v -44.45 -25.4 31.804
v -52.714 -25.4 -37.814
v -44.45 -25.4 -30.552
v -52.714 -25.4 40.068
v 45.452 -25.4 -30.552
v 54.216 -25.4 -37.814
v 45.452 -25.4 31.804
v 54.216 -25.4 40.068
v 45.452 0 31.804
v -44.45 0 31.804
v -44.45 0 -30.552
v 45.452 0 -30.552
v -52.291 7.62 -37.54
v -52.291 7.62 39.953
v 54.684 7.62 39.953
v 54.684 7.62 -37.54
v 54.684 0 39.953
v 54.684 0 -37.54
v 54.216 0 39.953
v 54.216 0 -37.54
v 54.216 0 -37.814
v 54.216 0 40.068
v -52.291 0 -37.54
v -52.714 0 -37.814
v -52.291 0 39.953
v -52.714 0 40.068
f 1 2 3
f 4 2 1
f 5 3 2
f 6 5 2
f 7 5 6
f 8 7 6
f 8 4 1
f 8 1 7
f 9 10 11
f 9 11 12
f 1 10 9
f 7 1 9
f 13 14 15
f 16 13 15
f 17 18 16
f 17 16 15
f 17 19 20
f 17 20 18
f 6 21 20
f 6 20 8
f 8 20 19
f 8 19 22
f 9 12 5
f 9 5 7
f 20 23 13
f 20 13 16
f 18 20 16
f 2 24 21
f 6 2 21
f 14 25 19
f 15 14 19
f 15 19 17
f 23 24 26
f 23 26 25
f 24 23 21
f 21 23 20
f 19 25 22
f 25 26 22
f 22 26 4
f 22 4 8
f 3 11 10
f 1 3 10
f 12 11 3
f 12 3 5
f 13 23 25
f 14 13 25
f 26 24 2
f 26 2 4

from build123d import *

# Parameters (mm, degrees)
F0_W     = 106.930423
F0_H     = 77.881411
F0_W_2   = 89.901697
F0_H_2   = 62.355211
F1_DEPTH = 25.4
F2_W     = 106.974344
F2_H     = 77.493225
F3_DEPTH = 7.62


with BuildPart() as f1:
    # F0 (on Front) → F1 (new body)
    with BuildSketch(Plane.XZ):
        with Locations((0.751262, 1.126902)):
            Rectangle(F0_W, F0_H)
        with Locations((0.500841, 0.626057)):
            Rectangle(F0_W_2, F0_H_2, mode=Mode.SUBTRACT)
    extrude(amount=F1_DEPTH)

    # F2 (on Front) → F3 (join)
    with BuildSketch(Plane.XZ):
        with Locations((1.196621, 1.206798)):
            Rectangle(F2_W, F2_H)
    extrude(amount=-F3_DEPTH)


solid = f1.part
